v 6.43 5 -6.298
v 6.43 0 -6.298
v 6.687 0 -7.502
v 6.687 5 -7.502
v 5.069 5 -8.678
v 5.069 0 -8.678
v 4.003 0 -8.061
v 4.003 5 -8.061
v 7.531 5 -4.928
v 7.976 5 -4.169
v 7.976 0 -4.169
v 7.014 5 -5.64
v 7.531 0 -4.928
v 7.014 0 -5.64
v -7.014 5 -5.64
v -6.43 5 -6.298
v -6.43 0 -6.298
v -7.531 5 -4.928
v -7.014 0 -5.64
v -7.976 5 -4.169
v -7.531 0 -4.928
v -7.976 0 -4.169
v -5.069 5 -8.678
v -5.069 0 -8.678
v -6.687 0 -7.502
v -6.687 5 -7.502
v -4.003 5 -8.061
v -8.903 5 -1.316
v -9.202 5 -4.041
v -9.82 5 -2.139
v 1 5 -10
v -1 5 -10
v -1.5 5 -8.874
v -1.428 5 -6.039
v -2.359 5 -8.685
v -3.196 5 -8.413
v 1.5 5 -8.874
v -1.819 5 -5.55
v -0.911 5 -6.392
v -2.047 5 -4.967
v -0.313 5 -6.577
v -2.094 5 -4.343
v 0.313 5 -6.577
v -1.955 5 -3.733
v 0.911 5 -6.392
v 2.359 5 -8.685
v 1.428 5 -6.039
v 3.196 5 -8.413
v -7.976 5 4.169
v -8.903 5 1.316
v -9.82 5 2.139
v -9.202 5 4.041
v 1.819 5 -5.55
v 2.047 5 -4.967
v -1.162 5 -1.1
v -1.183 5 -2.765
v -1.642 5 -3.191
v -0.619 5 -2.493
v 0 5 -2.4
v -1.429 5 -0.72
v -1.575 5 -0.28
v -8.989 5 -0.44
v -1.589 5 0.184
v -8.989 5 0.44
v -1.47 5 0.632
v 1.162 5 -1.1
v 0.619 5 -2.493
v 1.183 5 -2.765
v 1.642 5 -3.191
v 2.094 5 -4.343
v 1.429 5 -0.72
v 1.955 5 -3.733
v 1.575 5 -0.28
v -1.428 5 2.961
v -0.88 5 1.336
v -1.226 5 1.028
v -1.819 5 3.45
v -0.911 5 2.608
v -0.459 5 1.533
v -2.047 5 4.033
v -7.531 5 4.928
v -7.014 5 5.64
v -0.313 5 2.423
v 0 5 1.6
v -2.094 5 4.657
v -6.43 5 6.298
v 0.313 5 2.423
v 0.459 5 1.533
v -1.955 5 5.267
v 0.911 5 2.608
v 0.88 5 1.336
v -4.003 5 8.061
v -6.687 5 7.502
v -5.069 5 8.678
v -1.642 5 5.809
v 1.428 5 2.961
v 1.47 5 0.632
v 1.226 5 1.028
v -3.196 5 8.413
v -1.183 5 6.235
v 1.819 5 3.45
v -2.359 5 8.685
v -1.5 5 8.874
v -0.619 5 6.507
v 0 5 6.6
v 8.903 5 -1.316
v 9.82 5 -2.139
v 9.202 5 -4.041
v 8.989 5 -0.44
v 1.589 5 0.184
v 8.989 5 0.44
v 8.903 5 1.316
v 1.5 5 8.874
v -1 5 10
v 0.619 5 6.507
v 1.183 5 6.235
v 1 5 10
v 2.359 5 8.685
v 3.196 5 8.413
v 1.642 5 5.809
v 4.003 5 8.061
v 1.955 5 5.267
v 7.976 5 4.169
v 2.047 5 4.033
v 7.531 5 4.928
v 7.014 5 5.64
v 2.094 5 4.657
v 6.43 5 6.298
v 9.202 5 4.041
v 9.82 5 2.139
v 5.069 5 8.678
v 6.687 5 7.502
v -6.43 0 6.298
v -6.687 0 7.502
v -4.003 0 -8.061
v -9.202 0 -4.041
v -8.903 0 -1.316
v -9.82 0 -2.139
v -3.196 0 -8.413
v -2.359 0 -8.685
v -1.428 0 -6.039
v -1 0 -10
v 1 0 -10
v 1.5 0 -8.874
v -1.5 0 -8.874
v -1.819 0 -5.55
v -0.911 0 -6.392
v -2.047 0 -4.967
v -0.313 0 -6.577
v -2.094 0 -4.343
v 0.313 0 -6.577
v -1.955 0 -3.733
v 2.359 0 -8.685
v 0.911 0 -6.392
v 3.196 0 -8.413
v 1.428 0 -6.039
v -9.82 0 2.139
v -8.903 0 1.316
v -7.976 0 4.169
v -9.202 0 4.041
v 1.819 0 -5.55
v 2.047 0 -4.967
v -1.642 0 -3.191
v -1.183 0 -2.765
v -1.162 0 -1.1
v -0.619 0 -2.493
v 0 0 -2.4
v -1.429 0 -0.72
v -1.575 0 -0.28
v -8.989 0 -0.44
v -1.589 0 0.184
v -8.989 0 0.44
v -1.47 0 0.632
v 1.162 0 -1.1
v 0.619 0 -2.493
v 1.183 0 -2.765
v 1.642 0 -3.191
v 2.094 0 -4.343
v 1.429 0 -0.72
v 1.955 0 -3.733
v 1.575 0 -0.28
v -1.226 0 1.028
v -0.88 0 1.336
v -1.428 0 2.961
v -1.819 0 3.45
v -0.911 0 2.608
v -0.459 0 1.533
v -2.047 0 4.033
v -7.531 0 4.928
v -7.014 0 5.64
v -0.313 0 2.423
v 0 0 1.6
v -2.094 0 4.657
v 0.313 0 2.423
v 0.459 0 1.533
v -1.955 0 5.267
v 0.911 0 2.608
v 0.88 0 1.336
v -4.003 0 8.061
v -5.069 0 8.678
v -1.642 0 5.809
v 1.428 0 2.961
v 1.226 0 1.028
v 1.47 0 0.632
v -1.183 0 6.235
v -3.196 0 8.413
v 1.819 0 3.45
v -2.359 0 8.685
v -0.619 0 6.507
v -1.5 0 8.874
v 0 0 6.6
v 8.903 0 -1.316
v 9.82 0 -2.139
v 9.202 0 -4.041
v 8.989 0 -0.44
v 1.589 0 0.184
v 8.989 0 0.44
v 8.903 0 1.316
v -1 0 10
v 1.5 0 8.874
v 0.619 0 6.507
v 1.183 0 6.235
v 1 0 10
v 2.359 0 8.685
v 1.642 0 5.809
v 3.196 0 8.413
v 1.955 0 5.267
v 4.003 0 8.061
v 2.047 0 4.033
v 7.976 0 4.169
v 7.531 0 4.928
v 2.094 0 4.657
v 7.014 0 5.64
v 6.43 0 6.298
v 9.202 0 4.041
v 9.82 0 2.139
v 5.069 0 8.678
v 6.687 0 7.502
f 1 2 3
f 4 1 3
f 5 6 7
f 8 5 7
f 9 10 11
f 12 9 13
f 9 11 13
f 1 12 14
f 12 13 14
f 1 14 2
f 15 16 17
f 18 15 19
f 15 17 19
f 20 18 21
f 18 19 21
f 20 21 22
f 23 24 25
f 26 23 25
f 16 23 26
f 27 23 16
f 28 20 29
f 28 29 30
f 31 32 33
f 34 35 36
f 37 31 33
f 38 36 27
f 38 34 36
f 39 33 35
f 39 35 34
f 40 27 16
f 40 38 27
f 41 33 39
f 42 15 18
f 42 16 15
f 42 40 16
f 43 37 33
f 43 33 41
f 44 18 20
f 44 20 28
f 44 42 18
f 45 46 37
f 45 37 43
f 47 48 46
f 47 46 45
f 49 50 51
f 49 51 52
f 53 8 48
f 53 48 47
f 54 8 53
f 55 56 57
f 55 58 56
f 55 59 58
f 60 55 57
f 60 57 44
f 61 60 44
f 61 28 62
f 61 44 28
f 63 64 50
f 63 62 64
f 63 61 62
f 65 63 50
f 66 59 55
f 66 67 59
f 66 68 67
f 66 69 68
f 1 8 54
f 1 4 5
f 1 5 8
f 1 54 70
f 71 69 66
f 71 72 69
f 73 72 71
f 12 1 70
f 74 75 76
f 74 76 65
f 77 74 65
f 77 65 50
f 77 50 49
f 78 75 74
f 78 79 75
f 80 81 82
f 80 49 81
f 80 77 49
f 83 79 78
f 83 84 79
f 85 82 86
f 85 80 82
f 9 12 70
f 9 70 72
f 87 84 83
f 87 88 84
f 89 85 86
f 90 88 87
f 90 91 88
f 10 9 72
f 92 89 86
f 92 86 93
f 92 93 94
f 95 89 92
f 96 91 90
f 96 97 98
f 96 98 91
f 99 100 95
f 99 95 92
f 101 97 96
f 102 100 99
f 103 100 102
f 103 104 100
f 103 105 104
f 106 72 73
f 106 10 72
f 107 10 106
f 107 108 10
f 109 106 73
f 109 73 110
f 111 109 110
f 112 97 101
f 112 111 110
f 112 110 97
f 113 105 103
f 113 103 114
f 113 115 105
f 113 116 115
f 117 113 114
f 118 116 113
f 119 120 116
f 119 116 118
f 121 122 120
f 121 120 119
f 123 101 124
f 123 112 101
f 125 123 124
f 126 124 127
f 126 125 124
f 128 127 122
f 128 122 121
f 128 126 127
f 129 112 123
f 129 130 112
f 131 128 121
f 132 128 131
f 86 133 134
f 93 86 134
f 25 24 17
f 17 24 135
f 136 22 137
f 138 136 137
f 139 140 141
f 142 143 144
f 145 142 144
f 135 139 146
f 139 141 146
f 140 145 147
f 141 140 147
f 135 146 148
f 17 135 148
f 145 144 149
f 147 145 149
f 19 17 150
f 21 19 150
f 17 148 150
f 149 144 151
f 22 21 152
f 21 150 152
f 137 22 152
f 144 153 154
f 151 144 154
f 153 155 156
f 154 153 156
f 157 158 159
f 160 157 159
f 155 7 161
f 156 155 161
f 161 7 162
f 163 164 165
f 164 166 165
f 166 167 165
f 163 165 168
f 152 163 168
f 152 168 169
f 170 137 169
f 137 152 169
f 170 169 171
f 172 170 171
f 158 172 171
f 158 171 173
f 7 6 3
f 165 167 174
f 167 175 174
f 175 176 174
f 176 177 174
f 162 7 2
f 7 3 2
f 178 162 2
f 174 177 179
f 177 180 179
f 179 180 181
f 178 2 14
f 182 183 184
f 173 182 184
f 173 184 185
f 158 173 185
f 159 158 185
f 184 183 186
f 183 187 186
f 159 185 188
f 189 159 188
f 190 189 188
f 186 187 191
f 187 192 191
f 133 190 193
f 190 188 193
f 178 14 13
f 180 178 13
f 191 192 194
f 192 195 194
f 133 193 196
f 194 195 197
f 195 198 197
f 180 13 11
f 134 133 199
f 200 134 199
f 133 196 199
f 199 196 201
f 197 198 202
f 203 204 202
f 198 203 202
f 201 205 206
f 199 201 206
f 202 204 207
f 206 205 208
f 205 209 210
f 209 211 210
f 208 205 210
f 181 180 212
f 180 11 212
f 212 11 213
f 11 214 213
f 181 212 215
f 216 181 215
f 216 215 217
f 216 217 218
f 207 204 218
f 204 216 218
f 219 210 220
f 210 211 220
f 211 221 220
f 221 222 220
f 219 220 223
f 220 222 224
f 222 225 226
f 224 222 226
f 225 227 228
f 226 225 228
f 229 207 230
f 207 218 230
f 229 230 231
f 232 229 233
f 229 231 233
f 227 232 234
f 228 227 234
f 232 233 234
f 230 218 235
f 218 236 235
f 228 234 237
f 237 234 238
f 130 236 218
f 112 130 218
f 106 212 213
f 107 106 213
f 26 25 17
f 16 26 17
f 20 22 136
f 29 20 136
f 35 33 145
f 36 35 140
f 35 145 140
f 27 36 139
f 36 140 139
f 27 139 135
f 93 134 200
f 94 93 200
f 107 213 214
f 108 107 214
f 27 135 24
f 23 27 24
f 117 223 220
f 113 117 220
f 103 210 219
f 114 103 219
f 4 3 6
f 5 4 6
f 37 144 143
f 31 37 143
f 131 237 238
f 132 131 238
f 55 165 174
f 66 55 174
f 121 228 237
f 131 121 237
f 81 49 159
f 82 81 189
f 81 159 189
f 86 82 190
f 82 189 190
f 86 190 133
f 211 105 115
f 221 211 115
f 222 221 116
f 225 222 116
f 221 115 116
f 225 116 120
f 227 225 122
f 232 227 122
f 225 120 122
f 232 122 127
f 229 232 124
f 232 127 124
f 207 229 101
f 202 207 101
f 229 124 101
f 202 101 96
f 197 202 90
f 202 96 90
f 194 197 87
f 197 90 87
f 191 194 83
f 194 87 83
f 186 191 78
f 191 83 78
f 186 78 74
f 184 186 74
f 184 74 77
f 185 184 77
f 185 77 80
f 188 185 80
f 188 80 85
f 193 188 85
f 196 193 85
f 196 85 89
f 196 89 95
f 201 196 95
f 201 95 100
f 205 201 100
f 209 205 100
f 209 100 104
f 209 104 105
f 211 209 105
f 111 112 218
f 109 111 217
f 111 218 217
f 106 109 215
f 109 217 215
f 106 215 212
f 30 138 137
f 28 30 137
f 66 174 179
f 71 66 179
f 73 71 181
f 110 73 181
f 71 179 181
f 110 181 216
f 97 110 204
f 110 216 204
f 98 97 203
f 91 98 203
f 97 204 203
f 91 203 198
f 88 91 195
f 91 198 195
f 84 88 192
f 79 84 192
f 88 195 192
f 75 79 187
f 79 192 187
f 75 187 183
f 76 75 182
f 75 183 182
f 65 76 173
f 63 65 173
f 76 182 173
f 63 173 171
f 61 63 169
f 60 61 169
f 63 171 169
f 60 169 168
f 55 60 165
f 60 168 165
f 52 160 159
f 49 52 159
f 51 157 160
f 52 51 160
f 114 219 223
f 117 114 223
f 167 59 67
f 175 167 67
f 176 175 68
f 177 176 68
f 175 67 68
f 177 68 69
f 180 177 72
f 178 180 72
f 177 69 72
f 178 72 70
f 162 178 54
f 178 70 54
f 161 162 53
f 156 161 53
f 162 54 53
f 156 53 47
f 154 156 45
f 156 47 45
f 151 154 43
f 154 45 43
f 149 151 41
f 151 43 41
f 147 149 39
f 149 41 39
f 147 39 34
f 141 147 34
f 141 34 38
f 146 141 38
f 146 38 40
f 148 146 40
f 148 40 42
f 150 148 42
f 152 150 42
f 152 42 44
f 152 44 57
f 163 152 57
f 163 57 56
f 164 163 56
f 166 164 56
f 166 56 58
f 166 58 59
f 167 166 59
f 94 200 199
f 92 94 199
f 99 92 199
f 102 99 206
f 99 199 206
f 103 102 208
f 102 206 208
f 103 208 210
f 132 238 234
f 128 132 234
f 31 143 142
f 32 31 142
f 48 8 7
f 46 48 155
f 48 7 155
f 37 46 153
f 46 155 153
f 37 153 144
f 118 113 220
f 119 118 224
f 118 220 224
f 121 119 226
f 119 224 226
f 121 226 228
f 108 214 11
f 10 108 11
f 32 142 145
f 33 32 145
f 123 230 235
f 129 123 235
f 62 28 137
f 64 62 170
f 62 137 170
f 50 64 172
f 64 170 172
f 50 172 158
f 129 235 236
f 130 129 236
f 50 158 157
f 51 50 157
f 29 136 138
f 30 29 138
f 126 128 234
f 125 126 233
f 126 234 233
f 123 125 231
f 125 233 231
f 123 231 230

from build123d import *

# Parameters (mm, degrees)
SKETCH_1_R               = 9
EXTRUDE_1_DEPTH          = 5
EXTRUDE_START            = -5
EXTRUDE_2_DEPTH          = 5
PATTERN_CIRCULAR_1_COUNT = 10
CUT_EXTRUDE_1_REACH      = 16.88
SKETCH_3_R               = 2.1


with BuildPart() as part:
    # 草图1 → 凸台-拉伸1 (new body)
    with BuildSketch(Plane(origin=(0, 0, 0), x_dir=(1, 0, 0), z_dir=(0, 1, 0))):
        with Locations(Location((0, 0, 0), (0, 0, 270))):
            Circle(SKETCH_1_R)
        with BuildLine():
            Line((-1.161895004, 1.1), (1.161895004, 1.1))
            ThreePointArc((1.161895004, 1.1), (0, -1.6), (-1.161895004, 1.1))
        make_face(mode=Mode.SUBTRACT)
    extrude(amount=EXTRUDE_1_DEPTH)

    # 草图2 → 凸台-拉伸2 (add)
    with BuildSketch(Plane(origin=(0, 5, 0), x_dir=(1, 0, 0), z_dir=(0, 1, 0)).offset(EXTRUDE_START)):
        with BuildLine():
            Line((1.5, 8.874119675), (1, 10))
            Line((1, 10), (-1, 10))
            Line((-1, 10), (-1.5, 8.874119675))
            ThreePointArc((-1.5, 8.874119675), (0, 9), (1.5, 8.874119675))
        make_face()
    extrude_2 = extrude(amount=EXTRUDE_2_DEPTH)

    # 阵列(圆周)1: 凸台-拉伸2 ×10 about axis
    pattern_circular_1_axis = Axis((0, 0, 0), (0, 1, 0))
    for i in range(1, PATTERN_CIRCULAR_1_COUNT):
        add(extrude_2.rotate(pattern_circular_1_axis, i * 360 / PATTERN_CIRCULAR_1_COUNT))

    # 草图3 → 切除-拉伸1 (cut, up to next)
    with BuildSketch(Plane(origin=(0, 5, 0), x_dir=(1, 0, 0), z_dir=(0, 1, 0)), mode=Mode.PRIVATE) as cut_extrude_1_sk1:
        with Locations(Location((0, 4.5, 0), (0, 0, 270))):
            Circle(SKETCH_3_R)
    cut_extrude_1_tool1 = extrude(cut_extrude_1_sk1.sketch, amount=-CUT_EXTRUDE_1_REACH, mode=Mode.PRIVATE) & part.part
    # 草图3 → 切除-拉伸1 (cut, up to next)
    with BuildSketch(Plane(origin=(0, 5, 0), x_dir=(1, 0, 0), z_dir=(0, 1, 0)), mode=Mode.PRIVATE) as cut_extrude_1_sk2:
        with Locations(Location((0, -4.5, 0), (0, 0, 270))):
            Circle(SKETCH_3_R)
    cut_extrude_1_tool2 = extrude(cut_extrude_1_sk2.sketch, amount=-CUT_EXTRUDE_1_REACH, mode=Mode.PRIVATE) & part.part
    add(cut_extrude_1_tool1.solids().sort_by_distance((0, 5, -4.5))[0], mode=Mode.SUBTRACT)
    add(cut_extrude_1_tool2.solids().sort_by_distance((0, 5, 4.5))[0], mode=Mode.SUBTRACT)


solid = part.part
